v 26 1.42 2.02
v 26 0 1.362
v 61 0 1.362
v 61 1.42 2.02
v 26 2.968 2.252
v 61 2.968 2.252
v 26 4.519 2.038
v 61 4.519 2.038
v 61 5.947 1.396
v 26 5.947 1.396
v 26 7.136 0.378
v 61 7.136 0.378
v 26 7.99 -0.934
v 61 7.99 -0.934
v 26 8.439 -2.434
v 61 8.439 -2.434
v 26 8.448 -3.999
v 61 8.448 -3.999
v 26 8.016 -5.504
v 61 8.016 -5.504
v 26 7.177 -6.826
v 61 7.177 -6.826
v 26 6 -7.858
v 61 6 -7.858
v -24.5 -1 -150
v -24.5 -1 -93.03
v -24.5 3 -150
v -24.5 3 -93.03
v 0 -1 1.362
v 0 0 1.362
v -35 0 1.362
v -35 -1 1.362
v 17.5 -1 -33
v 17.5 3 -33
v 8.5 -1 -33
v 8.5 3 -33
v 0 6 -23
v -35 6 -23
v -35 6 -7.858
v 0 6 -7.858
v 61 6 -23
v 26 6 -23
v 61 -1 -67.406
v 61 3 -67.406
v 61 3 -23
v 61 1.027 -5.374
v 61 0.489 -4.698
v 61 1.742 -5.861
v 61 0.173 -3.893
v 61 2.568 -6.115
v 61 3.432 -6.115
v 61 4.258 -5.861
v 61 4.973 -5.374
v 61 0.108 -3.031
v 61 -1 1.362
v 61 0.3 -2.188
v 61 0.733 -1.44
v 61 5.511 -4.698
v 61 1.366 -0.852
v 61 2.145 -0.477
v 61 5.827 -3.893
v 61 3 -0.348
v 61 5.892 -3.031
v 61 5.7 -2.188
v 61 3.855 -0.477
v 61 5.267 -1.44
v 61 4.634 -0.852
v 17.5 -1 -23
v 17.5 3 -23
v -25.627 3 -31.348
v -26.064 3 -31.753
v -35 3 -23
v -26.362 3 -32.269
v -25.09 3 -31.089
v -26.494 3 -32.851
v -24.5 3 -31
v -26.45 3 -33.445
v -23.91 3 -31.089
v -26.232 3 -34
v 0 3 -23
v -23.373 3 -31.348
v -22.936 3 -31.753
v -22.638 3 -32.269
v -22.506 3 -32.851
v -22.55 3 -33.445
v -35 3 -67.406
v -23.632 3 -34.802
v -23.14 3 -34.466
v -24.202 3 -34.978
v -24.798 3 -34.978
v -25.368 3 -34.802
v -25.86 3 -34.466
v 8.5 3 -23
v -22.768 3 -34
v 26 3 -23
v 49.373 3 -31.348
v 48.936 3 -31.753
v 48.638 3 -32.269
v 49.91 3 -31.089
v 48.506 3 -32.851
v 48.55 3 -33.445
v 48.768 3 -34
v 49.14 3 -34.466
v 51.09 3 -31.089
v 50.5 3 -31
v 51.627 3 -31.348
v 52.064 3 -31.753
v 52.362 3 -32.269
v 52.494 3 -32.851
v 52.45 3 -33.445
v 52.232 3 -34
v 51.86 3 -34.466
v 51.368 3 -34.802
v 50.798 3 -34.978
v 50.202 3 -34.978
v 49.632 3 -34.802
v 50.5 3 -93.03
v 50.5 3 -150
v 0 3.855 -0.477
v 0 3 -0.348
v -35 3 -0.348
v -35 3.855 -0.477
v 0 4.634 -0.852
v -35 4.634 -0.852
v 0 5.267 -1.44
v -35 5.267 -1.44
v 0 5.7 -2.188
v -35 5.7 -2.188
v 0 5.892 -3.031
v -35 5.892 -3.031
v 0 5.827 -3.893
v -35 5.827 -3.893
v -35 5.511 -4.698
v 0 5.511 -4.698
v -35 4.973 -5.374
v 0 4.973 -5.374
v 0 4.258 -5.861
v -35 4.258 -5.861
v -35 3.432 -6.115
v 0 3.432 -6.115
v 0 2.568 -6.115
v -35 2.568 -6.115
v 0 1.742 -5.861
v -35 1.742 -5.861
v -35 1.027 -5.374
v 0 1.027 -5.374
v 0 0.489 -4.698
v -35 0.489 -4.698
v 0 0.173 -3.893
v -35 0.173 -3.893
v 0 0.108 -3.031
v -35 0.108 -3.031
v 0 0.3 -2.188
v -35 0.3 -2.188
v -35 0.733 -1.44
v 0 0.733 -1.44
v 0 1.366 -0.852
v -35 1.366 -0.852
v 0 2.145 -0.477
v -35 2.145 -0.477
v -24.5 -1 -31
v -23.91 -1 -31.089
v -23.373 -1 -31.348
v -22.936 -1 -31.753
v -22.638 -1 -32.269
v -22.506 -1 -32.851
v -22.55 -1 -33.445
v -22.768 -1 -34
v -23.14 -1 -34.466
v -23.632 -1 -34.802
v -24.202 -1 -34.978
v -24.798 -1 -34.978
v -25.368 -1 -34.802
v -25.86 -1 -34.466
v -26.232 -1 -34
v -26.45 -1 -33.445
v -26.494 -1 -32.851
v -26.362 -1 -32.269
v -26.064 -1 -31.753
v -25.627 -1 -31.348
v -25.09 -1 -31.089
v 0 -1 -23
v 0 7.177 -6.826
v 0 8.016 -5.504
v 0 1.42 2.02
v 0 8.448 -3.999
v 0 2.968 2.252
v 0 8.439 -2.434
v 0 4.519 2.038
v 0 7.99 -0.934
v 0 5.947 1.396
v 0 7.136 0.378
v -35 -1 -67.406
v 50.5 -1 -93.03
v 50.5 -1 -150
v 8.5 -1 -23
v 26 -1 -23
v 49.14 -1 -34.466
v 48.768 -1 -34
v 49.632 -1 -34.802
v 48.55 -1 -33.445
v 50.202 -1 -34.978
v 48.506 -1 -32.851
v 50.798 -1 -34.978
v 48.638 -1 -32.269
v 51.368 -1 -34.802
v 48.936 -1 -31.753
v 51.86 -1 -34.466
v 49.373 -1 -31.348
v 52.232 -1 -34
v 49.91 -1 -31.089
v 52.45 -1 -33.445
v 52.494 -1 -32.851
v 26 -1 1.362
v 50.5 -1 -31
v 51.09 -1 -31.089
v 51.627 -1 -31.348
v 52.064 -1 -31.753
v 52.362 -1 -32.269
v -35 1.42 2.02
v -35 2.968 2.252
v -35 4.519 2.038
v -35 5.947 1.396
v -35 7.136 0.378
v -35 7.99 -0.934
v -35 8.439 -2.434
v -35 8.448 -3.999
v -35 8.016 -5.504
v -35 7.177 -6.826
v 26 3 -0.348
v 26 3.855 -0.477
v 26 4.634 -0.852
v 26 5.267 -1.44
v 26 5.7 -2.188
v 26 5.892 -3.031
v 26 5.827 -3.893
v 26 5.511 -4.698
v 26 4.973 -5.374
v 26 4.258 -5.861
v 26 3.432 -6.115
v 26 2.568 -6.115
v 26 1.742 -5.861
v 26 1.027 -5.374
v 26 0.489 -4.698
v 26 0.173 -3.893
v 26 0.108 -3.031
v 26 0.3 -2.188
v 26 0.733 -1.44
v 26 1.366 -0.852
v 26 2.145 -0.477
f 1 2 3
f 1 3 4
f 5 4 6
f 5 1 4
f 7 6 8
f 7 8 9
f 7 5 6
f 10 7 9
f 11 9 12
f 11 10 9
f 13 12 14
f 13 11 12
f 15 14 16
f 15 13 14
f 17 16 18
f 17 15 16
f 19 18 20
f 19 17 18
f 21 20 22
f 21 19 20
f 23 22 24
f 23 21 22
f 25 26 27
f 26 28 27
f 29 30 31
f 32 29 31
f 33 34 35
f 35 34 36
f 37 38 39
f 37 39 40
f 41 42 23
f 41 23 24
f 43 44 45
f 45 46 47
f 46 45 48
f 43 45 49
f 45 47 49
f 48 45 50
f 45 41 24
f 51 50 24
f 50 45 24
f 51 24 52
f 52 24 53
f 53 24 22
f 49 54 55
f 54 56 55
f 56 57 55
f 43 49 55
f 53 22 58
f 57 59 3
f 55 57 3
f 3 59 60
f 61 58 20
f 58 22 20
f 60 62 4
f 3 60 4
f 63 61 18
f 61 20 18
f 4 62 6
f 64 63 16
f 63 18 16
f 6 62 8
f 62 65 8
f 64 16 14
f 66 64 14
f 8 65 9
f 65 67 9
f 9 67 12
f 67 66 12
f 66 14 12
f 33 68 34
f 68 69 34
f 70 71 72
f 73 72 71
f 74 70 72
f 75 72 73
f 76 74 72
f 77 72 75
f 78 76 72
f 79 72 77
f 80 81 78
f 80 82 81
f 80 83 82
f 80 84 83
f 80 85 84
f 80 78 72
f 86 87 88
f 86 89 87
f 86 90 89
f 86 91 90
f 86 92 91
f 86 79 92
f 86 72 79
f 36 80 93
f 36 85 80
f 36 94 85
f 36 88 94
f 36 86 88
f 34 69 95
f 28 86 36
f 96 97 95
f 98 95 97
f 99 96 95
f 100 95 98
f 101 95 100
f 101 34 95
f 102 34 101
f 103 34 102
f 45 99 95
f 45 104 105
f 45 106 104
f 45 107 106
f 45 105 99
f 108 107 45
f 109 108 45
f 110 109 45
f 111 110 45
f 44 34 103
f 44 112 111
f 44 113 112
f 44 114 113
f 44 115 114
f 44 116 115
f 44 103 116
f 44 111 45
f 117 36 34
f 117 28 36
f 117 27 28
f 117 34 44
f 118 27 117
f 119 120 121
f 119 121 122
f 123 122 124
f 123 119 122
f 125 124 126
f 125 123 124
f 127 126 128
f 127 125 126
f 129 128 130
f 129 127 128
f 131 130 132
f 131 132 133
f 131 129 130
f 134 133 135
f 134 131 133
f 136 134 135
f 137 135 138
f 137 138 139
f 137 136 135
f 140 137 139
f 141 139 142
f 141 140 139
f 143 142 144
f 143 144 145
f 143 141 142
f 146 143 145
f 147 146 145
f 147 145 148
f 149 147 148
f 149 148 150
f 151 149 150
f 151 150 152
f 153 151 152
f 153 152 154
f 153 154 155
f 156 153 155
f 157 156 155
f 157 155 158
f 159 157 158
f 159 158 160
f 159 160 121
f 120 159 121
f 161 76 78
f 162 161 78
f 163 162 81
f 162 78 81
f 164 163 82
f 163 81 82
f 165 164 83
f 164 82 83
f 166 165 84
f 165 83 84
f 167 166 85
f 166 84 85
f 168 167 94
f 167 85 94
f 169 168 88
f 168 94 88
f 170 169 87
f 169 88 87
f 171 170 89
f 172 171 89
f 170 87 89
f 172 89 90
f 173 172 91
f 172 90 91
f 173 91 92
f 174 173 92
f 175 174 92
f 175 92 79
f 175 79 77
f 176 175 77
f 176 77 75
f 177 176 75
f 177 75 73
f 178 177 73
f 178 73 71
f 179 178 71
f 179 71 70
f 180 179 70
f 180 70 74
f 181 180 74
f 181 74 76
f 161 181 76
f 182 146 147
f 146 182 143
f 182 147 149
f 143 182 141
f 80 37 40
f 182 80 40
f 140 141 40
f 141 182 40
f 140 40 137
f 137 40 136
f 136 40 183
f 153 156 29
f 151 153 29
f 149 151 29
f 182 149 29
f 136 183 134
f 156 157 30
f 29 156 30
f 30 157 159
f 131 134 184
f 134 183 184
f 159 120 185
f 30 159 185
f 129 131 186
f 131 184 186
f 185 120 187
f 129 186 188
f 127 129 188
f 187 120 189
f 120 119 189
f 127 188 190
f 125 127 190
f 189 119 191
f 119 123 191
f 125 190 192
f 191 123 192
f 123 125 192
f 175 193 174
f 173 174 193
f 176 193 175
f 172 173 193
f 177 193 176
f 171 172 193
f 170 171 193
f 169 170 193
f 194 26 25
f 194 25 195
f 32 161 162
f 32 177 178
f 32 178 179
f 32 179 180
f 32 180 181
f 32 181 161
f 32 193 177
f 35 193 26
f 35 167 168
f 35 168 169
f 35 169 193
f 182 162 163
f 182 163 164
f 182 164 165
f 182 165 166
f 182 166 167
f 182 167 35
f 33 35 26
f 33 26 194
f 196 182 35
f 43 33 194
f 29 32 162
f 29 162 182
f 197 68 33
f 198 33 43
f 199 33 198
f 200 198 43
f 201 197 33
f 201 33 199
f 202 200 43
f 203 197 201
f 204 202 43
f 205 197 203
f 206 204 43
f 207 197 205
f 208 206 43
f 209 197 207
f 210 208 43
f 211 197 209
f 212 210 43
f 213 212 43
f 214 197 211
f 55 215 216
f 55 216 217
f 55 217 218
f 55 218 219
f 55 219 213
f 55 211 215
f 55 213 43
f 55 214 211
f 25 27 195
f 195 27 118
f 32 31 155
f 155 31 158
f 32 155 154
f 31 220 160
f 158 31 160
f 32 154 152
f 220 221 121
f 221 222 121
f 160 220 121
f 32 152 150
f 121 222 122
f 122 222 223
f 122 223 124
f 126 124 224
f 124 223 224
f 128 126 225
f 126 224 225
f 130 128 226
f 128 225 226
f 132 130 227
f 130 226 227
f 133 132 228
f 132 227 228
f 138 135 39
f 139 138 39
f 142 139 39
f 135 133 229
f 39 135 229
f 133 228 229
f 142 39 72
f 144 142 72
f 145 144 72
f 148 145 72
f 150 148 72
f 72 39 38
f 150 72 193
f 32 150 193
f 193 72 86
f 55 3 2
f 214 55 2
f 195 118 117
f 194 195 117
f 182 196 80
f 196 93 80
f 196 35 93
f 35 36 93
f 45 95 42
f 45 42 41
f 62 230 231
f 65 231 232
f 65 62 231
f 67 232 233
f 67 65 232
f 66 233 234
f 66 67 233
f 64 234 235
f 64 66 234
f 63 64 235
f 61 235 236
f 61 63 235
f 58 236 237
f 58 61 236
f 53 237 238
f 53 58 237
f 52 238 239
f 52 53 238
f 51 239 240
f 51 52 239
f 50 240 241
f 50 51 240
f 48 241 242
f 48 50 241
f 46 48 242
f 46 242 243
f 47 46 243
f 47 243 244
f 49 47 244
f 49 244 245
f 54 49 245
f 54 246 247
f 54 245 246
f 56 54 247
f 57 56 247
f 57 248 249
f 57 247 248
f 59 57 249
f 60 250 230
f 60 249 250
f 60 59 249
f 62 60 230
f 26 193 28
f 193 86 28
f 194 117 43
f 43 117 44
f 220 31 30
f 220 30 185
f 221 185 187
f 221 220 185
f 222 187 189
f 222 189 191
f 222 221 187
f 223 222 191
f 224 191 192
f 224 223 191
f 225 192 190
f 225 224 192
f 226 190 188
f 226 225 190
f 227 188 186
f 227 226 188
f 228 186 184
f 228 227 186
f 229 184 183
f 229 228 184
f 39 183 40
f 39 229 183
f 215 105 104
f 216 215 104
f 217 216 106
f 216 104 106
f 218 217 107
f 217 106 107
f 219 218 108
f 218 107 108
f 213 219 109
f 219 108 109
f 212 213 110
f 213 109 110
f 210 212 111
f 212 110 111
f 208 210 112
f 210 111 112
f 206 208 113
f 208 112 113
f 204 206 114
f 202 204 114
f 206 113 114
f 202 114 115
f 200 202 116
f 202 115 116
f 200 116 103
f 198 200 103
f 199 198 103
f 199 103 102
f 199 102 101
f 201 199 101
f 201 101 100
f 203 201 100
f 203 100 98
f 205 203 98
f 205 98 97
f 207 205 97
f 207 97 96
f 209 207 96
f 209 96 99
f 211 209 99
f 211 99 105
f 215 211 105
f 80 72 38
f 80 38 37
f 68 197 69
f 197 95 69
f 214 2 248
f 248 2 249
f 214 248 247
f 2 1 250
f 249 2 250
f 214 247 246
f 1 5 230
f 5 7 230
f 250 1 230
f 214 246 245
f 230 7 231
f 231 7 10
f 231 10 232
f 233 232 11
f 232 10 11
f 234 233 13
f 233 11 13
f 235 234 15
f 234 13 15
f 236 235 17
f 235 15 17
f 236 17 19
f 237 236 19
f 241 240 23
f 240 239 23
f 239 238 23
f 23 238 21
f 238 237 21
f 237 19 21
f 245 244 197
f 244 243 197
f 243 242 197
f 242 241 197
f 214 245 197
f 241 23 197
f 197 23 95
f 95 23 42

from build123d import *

# Parameters (mm, degrees)
BOSS_EXTRUDE1_DEPTH = 3
SKETCH5_W           = 35
SKETCH5_H           = 23
BOSS_EXTRUDE2_DEPTH = 3
BOSS_EXTRUDE5_DEPTH = 35
BOSS_EXTRUDE8_START = -35
BOSS_EXTRUDE8_DEPTH = 35
CUT_EXTRUDE1_START  = -96
SKETCH11_R          = 2.9
CUT_EXTRUDE1_DEPTH  = 96
BOSS_EXTRUDE7_DEPTH = 1
SKETCH17_R          = 2
CUT_EXTRUDE2_DEPTH  = 10


with BuildPart() as part:
    # Sketch1 → Boss-Extrude1 (new body)
    with BuildSketch(Plane(origin=(0, 0, 0), x_dir=(1, 0, 0), z_dir=(0, 1, 0))):
        Polygon((0, 0), (0, 23), (8.5, 23), (8.5, 33), (17.5, 33), (17.5, 23), (26, 23), (26, 0), (61, 0), (61, 28.801365462), (61, 67.406151765), (50.5, 93.029580251), (50.5, 150), (-24.5, 150), (-24.5, 93.029580251), (-35, 67.406151765), (-35, 28.801365462), (-35, 0), align=None)
    extrude(amount=BOSS_EXTRUDE1_DEPTH)

    # Sketch5 → Boss-Extrude2 (add)
    with BuildSketch(Plane(origin=(0, 3, 0), x_dir=(1, 0, 0), z_dir=(0, 1, 0))):
        with Locations((-17.5, 11.5)):
            Rectangle(SKETCH5_W, SKETCH5_H)
        with Locations((43.5, 11.5)):
            Rectangle(SKETCH5_W, SKETCH5_H)
    extrude(amount=BOSS_EXTRUDE2_DEPTH)

    # Sketch12 → Boss-Extrude5 (add)
    with BuildSketch(Plane.ZY.offset(35)):
        with BuildLine():
            Line((-7.857598958, 0), (1.361945499, 0))
            ThreePointArc((1.361945499, 0), (-3.247826729, 8.5), (-7.857598958, 0))
        make_face()
    extrude(amount=-BOSS_EXTRUDE5_DEPTH)

    # Sketch15 → Boss-Extrude8 (add)
    with BuildSketch(Plane(origin=(61, 0, 0), x_dir=(0, 0, -1), z_dir=(1, 0, 0)).offset(BOSS_EXTRUDE8_START)):
        with BuildLine():
            Line((7.857598958, 0), (-1.361945499, 0))
            ThreePointArc((-1.361945499, 0), (3.247826729, 8.5), (7.857598958, 0))
        make_face()
    extrude(amount=BOSS_EXTRUDE8_DEPTH)

    # Sketch11 → Cut-Extrude1 (cut)
    with BuildSketch(Plane.ZY.offset(35).offset(CUT_EXTRUDE1_START)):
        with Locations((-3.247826729, 3)):
            Circle(SKETCH11_R)
    extrude(amount=CUT_EXTRUDE1_DEPTH, mode=Mode.SUBTRACT)

    # Sketch14 → Boss-Extrude7 (add)
    with BuildSketch(Plane.XZ):
        Polygon((50.5, -93.029580251), (61, -67.406151765), (61, 1.361945499), (26, 1.361945499), (26, -23), (17.5, -23), (17.5, -33), (8.5, -33), (8.5, -23), (0, -23), (0, 1.361945499), (-35, 1.361945499), (-35, -67.406151765), (-24.5, -93.029580251), (-24.5, -150), (50.5, -150), align=None)
    extrude(amount=BOSS_EXTRUDE7_DEPTH)

    # Sketch17 → Cut-Extrude2 (cut)
    with BuildSketch(Plane(origin=(0, 3, 0), x_dir=(1, 0, 0), z_dir=(0, 1, 0))):
        with Locations(Location((-24.5, 33, 0), (0, 0, 270))):
            Circle(SKETCH17_R)
        with Locations(Location((50.5, 33, 0), (0, 0, 270))):
            Circle(SKETCH17_R)
    extrude(amount=-CUT_EXTRUDE2_DEPTH, mode=Mode.SUBTRACT)


solid = part.part
